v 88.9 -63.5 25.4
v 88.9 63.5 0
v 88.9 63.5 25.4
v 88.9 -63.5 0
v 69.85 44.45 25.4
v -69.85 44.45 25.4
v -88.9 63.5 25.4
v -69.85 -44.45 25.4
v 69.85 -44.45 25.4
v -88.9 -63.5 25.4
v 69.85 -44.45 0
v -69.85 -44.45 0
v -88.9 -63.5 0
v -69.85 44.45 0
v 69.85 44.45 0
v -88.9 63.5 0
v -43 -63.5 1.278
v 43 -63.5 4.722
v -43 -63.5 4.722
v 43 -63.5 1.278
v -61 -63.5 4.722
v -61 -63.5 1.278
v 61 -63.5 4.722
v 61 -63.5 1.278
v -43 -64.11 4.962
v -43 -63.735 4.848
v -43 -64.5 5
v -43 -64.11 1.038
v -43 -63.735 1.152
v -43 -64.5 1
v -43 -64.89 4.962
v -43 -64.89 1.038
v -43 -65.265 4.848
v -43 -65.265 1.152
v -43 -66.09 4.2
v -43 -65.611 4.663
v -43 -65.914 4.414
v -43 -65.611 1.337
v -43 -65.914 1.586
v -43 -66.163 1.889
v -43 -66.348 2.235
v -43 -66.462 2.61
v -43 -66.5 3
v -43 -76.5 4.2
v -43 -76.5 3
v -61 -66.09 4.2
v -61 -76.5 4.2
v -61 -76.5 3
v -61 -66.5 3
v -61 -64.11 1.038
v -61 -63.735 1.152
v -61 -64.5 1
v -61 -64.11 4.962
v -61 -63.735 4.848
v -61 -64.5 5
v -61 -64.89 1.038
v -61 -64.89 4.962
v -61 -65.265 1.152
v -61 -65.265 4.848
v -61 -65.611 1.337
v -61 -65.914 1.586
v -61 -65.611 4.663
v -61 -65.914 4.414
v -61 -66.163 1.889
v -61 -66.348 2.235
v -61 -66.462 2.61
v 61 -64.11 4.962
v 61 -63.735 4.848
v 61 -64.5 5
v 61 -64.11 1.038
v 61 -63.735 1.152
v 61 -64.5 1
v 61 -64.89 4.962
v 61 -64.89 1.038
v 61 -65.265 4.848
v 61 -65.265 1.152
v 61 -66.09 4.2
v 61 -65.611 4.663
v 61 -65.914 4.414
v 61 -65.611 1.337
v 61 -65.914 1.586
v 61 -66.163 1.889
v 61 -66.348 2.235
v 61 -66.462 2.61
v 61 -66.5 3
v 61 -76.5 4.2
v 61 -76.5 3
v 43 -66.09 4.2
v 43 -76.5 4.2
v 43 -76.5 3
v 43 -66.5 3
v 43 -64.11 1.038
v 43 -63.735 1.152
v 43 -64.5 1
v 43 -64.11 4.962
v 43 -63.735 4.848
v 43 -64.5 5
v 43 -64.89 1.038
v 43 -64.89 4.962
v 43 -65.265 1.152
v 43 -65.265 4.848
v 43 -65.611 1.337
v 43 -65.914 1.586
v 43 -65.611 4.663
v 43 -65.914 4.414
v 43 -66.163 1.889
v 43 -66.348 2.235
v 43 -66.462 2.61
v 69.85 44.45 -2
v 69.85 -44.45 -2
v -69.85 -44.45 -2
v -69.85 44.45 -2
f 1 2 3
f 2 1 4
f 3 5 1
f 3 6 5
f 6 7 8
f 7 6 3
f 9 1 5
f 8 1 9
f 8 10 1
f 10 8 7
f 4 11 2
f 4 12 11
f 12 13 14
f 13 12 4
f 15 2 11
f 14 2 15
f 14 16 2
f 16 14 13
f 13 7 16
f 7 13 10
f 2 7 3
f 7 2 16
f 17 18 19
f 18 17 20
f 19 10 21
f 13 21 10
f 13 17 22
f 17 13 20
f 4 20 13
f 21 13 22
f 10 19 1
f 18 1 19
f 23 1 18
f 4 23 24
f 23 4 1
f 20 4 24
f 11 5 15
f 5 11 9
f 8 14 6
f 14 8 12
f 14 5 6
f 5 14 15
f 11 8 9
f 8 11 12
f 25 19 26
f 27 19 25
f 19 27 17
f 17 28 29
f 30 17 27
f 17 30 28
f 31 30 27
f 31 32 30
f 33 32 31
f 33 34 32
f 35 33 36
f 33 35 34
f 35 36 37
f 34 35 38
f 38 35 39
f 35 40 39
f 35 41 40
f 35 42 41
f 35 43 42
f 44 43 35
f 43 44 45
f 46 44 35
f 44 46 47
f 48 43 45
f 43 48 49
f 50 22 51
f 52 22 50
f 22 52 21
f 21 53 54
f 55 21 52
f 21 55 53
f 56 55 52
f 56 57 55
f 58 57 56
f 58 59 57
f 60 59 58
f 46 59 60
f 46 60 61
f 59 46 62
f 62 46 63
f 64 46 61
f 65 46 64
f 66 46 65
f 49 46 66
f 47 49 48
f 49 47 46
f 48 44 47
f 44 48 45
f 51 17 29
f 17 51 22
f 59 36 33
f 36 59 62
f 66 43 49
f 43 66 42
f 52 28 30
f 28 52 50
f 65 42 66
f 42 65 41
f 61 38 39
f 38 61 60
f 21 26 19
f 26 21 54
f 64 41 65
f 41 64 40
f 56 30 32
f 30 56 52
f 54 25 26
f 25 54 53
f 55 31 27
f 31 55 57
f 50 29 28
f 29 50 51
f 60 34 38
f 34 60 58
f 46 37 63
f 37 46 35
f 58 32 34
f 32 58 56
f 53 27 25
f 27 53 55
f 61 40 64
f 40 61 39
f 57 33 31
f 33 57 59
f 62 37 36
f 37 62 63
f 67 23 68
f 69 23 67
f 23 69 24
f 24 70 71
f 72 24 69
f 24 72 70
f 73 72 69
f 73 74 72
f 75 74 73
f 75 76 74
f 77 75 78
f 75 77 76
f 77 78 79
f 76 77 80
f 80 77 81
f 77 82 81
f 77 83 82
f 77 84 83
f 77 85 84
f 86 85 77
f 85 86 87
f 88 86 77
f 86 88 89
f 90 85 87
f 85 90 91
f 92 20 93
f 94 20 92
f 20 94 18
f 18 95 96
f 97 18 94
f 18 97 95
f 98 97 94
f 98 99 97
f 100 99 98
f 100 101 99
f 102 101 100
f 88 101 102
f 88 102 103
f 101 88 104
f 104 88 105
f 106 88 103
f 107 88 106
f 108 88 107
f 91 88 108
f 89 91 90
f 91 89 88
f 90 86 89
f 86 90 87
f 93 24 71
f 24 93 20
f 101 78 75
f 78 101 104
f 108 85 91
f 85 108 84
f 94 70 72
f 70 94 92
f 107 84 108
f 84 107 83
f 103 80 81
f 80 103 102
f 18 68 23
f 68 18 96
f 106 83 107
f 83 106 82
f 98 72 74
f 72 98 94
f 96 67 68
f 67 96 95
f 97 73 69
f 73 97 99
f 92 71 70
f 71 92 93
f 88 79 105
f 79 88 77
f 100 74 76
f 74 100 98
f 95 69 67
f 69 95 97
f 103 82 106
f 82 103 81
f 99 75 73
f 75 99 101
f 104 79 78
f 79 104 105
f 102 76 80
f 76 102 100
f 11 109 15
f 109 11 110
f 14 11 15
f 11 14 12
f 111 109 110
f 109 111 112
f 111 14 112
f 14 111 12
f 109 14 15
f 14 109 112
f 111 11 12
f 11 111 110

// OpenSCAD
// Luminary hinged front door reference model.
// Wood components; dimensions in millimetres. This is a woodworking assembly
// drawing, not a recommended one-piece FDM print.

$fn = 32;
part = "assembly"; // door, hinges, glass, assembly

door_w = 177.8;     // 7 in outer width
door_h = 127.0;     // 5 in outer height
door_d = 25.4;      // 1 in depth
window_w = 139.7;   // 5.5 in clear opening
window_h = 88.9;    // 3.5 in clear opening
rail = (door_w - window_w) / 2; // 19.05 mm / 0.75 in
glass_t = 2.0;

module door() {
    // Boolean ring guarantees one watertight reference solid while preserving
    // the four 0.75 in wood rail dimensions for the cut list.
    difference() {
        translate([-door_w/2, -door_h/2, 0]) cube([door_w, door_h, door_d]);
        translate([-window_w/2, -window_h/2, -0.01]) cube([window_w, window_h, door_d + 0.02]);
    }
}

module glass() {
    // Glass is seated at the front surface of the closed door.
    translate([-window_w/2, -window_h/2, -glass_t]) cube([window_w, window_h, glass_t]);
}

module hinge(x) {
    // Two-leaf butt hinge: one leaf on the door and one on the case rail.
    translate([x - 9, -door_h/2 - 1, 3]) cube([18, 12, 1.2]);
    translate([x - 9, -door_h/2 - 13, 3]) cube([18, 12, 1.2]);
    translate([x, -door_h/2 - 1, 3]) rotate([0, 90, 0]) cylinder(d = 4, h = 18, center = true);
}

if (part == "door") door();
if (part == "glass") glass();
if (part == "hinges") { hinge(-52); hinge(52); }
if (part == "assembly") { door(); glass(); hinge(-52); hinge(52); }
